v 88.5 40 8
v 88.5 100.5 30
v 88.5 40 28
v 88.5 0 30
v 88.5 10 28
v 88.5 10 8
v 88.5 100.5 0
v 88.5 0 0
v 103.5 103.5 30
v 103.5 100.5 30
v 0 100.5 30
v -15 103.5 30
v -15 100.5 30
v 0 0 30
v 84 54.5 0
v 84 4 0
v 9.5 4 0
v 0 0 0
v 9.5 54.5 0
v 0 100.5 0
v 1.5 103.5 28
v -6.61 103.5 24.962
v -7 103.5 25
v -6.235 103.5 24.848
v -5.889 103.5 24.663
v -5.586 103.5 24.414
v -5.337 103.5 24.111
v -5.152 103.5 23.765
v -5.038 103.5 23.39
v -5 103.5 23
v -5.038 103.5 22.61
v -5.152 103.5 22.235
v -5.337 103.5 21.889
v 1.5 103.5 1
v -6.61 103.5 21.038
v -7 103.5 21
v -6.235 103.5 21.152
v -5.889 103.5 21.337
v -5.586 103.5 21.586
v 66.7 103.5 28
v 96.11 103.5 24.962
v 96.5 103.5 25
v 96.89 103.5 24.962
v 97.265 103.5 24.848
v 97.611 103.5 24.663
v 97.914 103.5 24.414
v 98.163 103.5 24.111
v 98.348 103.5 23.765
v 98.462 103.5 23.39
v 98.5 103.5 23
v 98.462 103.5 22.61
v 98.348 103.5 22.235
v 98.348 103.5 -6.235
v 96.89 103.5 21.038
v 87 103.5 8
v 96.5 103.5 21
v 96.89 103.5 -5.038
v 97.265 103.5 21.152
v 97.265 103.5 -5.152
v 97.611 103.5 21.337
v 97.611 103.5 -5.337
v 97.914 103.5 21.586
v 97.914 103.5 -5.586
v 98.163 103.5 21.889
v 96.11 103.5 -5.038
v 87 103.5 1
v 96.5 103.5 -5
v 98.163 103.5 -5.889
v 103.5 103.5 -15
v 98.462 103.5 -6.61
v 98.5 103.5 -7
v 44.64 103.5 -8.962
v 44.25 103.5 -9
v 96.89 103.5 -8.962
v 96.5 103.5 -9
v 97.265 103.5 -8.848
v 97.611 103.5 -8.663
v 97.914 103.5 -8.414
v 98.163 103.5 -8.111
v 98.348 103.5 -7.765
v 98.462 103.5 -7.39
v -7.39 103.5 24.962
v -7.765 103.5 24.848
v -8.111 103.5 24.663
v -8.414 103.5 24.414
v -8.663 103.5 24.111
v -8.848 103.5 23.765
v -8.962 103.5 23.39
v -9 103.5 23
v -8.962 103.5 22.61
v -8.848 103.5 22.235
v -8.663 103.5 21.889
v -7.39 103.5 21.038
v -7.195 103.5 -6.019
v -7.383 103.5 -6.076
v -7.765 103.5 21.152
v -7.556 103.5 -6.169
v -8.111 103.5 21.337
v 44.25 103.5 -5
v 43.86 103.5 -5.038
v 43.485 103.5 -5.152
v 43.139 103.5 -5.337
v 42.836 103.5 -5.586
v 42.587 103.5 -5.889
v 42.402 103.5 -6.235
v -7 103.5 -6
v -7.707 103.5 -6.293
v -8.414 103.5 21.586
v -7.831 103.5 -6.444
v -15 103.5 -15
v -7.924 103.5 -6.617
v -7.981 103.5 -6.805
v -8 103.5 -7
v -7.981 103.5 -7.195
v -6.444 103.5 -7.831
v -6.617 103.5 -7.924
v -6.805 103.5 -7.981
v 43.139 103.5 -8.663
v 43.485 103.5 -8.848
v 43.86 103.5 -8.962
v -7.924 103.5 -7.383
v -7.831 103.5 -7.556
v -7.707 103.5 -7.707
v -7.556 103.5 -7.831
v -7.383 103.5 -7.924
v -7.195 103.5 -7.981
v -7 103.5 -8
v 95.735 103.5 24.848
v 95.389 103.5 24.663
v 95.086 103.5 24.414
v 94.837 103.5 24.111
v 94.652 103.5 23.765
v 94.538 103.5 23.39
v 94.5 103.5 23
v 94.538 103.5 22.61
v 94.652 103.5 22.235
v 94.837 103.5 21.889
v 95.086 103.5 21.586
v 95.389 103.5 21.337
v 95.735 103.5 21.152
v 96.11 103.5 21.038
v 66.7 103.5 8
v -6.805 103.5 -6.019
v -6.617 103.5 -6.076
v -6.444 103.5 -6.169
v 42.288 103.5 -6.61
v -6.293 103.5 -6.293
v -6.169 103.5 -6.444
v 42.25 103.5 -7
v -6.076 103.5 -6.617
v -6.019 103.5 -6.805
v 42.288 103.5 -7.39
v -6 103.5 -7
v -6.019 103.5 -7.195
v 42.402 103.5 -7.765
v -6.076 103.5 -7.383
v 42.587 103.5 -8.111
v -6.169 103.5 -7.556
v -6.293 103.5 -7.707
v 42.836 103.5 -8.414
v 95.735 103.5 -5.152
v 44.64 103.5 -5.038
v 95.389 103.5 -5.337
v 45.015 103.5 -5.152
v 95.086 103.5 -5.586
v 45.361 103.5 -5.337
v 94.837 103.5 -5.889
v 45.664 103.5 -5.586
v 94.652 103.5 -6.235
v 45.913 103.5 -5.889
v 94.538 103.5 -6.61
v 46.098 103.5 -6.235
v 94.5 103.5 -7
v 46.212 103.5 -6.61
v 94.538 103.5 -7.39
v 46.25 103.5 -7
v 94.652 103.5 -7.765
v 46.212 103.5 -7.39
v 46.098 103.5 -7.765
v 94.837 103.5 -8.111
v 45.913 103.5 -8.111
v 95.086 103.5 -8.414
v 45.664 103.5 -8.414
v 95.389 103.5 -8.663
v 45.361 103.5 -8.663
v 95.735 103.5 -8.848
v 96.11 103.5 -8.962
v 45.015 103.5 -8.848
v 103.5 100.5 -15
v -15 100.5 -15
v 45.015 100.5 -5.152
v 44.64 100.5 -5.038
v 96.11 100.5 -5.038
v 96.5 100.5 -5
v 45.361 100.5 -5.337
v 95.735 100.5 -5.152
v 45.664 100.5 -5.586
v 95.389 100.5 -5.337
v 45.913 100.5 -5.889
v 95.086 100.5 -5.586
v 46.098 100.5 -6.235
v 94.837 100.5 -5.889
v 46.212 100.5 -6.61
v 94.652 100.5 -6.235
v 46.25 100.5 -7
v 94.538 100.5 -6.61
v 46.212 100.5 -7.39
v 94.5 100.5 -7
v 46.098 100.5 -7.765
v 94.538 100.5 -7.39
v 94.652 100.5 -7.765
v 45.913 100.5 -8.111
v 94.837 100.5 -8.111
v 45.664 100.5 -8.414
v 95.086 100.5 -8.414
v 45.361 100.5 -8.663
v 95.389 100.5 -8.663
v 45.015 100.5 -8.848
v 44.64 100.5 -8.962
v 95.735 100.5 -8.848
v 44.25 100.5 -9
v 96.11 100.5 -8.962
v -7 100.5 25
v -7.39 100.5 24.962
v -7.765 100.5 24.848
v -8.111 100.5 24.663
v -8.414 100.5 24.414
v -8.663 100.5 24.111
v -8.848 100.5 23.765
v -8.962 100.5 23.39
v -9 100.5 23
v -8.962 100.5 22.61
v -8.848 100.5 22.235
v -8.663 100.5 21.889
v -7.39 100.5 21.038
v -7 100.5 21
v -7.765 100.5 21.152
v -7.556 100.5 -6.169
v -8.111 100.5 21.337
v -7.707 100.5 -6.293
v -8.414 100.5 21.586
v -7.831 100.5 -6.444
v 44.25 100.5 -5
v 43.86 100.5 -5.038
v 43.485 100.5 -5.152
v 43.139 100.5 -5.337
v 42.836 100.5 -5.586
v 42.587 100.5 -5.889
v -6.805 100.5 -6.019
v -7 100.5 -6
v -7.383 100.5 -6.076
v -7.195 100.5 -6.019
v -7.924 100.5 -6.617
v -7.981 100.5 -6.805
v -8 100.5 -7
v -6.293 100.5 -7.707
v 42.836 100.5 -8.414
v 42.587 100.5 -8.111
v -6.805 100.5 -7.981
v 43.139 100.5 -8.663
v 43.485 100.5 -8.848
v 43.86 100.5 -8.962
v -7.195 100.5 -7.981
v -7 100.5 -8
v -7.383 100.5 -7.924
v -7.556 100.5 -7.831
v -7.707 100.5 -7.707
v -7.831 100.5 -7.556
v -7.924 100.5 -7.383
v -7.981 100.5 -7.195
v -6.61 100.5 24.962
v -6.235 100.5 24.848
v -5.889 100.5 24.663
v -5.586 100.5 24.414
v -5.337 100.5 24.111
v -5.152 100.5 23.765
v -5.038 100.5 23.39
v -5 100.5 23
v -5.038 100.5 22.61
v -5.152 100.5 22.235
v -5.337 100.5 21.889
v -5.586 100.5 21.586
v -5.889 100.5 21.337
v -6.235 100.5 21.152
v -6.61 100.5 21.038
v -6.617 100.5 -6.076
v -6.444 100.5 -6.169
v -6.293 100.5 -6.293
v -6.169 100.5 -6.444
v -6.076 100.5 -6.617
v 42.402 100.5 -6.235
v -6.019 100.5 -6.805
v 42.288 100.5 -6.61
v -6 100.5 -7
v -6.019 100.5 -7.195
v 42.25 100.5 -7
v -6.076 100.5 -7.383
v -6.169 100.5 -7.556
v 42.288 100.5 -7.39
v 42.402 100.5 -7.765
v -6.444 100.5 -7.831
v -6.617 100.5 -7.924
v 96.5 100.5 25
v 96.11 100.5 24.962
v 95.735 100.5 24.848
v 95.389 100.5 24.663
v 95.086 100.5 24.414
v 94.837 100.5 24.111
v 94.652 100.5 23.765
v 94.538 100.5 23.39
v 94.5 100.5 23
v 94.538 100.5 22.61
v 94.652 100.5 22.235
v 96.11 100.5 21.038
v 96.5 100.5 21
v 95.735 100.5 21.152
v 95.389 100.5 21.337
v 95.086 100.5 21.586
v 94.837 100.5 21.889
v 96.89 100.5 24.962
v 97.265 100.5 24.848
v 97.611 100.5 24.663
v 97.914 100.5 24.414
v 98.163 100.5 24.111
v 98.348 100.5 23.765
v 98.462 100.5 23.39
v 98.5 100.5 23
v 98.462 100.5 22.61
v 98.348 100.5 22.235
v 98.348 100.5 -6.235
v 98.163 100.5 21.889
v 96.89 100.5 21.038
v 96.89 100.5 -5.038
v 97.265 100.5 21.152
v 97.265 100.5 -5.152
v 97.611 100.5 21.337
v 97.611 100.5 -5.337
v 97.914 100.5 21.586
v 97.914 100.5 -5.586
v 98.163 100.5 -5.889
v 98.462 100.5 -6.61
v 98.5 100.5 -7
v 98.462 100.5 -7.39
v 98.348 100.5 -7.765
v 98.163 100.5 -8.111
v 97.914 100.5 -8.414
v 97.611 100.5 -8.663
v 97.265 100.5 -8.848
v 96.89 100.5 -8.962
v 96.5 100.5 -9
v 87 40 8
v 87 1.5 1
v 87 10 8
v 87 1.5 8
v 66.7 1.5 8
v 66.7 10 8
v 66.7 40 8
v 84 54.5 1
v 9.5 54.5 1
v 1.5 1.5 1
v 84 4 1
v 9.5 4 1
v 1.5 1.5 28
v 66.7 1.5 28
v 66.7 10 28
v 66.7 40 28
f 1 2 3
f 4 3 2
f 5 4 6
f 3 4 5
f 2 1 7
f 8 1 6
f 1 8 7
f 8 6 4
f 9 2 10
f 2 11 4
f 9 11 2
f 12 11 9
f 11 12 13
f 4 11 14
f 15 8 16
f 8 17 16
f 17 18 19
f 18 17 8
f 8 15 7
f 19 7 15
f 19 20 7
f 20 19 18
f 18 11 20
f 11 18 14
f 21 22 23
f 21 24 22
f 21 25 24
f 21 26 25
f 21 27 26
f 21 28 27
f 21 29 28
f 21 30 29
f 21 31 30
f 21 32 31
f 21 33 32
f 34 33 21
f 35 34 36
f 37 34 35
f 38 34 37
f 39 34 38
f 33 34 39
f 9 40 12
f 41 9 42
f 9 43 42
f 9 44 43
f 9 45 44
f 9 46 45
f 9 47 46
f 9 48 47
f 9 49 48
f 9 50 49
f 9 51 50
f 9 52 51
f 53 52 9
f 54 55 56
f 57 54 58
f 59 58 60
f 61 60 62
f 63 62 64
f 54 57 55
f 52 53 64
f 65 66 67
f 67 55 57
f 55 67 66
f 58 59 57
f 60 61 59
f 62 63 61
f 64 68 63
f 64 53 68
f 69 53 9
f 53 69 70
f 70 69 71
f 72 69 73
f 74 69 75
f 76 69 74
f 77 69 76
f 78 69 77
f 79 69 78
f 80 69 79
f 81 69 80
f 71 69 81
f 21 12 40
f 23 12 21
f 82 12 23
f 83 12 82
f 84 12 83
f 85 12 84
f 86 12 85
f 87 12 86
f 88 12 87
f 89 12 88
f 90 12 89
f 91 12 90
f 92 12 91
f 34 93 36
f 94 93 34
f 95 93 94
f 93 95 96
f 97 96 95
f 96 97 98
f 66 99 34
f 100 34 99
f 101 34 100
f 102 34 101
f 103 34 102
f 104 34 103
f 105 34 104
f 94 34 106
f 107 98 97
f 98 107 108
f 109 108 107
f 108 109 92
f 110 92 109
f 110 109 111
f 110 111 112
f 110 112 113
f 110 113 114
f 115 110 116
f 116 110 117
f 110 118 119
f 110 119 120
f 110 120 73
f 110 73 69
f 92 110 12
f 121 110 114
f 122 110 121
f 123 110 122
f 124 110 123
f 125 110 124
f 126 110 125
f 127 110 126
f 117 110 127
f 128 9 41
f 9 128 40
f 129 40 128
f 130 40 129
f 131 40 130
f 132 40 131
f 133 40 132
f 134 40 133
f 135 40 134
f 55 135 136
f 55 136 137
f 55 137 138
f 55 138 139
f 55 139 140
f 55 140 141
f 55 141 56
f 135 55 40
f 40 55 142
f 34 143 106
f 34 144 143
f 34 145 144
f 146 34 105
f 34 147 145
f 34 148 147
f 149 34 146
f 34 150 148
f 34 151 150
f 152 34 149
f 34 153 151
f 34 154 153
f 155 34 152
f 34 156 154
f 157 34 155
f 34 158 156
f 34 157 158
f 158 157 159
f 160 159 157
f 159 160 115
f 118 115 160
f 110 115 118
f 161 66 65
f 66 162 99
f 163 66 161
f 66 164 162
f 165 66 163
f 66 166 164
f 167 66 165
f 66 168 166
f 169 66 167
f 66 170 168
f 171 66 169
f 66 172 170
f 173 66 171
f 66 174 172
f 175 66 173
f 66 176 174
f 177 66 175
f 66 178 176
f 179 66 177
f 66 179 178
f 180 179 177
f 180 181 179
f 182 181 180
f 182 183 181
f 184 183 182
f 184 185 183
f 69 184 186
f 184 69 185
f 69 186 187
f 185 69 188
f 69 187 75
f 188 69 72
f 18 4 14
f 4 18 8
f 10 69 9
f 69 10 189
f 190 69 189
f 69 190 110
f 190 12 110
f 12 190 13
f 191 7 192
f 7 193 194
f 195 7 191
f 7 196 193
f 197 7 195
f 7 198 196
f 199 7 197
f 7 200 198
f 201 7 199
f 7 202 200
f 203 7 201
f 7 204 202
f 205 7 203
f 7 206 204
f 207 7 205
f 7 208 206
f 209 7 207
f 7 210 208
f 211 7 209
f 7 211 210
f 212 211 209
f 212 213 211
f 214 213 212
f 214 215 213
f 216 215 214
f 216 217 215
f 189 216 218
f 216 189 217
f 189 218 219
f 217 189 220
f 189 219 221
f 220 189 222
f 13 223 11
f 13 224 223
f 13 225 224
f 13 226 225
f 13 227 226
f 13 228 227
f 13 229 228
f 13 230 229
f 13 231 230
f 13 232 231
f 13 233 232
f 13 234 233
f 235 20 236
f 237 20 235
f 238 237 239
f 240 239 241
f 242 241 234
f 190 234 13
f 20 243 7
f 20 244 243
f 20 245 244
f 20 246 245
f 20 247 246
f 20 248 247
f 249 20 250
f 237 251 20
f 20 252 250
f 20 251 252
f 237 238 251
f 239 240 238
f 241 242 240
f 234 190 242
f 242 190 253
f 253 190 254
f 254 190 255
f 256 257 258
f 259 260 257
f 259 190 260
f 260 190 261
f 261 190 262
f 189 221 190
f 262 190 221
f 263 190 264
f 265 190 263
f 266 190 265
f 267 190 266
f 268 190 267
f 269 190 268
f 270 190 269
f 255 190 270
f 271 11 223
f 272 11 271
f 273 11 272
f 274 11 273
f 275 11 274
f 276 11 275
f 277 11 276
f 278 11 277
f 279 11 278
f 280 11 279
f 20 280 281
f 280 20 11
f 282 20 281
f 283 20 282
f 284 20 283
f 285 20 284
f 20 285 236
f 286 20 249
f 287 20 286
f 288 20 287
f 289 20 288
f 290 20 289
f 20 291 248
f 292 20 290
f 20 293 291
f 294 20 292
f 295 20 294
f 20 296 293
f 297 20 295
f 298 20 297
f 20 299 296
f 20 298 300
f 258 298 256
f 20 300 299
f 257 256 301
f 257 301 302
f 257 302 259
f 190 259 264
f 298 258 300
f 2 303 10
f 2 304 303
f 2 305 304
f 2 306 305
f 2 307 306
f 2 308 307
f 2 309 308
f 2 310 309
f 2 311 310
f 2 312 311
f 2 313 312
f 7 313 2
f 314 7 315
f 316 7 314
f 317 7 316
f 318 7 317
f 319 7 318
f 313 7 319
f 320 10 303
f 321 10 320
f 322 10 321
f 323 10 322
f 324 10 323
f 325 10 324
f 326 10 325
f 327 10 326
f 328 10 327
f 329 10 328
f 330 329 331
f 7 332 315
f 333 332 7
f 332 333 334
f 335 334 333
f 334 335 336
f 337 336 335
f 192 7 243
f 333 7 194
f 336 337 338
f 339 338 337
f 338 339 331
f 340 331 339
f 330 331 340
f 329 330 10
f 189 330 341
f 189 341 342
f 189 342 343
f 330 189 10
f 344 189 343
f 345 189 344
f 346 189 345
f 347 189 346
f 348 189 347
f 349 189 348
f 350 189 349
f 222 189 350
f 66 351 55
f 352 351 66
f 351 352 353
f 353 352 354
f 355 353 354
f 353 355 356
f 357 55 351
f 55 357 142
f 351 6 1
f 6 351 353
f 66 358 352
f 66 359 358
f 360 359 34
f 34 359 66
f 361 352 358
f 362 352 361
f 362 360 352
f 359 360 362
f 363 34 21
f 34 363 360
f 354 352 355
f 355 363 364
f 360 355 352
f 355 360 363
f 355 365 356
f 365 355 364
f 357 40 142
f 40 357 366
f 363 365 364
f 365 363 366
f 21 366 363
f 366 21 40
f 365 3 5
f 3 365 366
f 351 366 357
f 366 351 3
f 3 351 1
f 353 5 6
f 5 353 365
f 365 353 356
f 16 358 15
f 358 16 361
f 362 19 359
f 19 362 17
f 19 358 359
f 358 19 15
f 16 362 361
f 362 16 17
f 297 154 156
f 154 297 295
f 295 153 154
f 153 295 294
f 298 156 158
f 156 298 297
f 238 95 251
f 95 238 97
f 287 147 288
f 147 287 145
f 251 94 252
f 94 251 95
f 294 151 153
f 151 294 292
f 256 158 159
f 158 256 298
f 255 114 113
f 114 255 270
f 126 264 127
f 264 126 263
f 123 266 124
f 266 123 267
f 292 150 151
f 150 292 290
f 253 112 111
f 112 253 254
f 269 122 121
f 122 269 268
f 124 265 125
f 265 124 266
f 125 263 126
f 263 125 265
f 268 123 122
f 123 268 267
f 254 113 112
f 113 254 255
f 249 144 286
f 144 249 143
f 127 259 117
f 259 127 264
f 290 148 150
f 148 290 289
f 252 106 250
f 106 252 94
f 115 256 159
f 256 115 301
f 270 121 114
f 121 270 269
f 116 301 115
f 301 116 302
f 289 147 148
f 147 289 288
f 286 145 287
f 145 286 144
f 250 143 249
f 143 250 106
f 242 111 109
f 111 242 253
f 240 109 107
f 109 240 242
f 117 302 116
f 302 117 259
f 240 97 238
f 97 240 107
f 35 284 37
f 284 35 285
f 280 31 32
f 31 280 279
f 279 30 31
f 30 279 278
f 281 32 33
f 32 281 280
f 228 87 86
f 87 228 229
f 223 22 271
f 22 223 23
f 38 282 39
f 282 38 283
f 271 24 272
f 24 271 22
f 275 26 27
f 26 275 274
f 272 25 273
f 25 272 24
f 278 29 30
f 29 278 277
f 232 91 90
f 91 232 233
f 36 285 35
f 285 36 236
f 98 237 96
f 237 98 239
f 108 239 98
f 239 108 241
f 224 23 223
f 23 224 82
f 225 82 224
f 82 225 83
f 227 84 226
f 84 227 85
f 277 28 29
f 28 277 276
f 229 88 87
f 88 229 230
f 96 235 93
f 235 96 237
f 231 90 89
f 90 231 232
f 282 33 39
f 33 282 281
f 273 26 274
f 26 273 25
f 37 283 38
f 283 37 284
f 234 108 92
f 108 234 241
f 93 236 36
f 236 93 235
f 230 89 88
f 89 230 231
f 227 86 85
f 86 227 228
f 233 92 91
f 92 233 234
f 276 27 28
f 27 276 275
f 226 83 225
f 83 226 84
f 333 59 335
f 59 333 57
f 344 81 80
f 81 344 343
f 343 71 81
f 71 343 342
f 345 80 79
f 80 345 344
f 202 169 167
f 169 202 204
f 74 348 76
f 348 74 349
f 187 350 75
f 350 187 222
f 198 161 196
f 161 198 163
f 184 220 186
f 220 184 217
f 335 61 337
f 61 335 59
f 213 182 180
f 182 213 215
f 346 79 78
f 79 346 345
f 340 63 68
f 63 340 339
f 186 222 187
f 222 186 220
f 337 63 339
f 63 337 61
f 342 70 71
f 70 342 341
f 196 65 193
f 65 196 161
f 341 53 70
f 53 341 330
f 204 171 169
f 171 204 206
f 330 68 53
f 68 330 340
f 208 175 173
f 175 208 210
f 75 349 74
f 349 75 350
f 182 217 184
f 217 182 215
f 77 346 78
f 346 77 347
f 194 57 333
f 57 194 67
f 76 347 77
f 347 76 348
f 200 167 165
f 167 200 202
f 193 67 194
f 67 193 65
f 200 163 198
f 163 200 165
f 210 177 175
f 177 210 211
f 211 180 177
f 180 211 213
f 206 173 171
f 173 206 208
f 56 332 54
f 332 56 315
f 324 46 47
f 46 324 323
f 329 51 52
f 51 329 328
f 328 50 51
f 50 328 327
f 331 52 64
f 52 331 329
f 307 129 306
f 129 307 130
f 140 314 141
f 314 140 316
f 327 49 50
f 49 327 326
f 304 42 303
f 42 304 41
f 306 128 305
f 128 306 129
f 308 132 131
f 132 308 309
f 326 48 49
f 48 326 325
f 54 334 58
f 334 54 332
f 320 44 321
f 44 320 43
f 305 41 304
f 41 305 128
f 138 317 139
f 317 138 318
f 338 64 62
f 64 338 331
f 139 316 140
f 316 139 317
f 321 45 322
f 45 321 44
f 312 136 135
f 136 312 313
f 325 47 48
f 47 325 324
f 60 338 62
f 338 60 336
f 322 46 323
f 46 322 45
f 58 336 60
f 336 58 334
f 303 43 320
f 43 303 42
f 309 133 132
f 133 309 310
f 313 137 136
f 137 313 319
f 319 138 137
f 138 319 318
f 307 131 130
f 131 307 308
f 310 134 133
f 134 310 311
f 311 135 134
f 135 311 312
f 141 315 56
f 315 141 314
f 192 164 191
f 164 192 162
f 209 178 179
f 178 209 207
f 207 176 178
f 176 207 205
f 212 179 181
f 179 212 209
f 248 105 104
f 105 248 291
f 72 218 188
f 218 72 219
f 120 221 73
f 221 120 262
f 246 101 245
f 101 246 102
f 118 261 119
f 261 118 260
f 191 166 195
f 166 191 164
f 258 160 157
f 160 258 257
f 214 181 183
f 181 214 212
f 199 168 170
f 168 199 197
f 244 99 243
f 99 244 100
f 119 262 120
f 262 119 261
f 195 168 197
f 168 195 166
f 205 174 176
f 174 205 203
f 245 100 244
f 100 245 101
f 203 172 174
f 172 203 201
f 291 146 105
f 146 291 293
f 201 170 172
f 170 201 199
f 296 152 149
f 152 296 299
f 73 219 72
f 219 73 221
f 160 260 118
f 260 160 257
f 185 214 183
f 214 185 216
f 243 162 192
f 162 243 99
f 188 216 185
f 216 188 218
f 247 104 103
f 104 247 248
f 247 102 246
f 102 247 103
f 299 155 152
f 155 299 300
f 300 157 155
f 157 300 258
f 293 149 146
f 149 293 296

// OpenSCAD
display = [85.5, 55.5, 7];
lcd = [74.5, 50.5, 5];
rpi = [65.2, 56.2, 20];
thick = 1.5;
border=7;
drill = 4;
$fn=32;

difference() {
    union() {
        cube([display[0], display[1] + 45, display[2] + rpi[2]] + [2 * thick, 2 * thick, 2 * thick]);
        translate([- 15, display[1] + 45, - 15]) cube([display[0] + 30 + 2 * thick, 2 * thick, display[2] + rpi[2] + 15
            + 2 * thick]);
    }
    translate([thick, thick, 1]) cube(display + [0, 20 + 45, 0]);
    translate([thick, thick, 1 + display[2]]) cube(rpi + [0, 20 + 45, 0]);
    translate([40, 10, 1 + display[2]]) cube([50, 30, rpi[2]]);
    translate([(display[0] - lcd[0]) - thick, thick + (display[1] - lcd[1]) / 2, - 1]) cube(lcd);
    translate([- border, - 1, - border]) rotate([- 90, 0, 0]) cylinder(d = 2, h = 200);
    translate([- border, - 1, display[2] + rpi[2] + 2 * thick - border]) rotate([- 90, 0, 0]) cylinder(d = drill, h = 200);
    translate([display[0] + 30 + 2 * thick - border - 15, - 1, - border]) rotate([- 90, 0, 0]) cylinder(d = drill, h = 200);
    translate([display[0] + 30 + 2 * thick - border - 15, - 1, display[2] + rpi[2] + 2 * thick - border]) rotate([- 90, 0, 0])
        cylinder(d = drill, h = 200);
    translate([(display[0] + 30 + 2 * thick) / 2 - 15, - 1, - border]) rotate([- 90, 0, 0]) cylinder(d = drill, h = 200);
}
